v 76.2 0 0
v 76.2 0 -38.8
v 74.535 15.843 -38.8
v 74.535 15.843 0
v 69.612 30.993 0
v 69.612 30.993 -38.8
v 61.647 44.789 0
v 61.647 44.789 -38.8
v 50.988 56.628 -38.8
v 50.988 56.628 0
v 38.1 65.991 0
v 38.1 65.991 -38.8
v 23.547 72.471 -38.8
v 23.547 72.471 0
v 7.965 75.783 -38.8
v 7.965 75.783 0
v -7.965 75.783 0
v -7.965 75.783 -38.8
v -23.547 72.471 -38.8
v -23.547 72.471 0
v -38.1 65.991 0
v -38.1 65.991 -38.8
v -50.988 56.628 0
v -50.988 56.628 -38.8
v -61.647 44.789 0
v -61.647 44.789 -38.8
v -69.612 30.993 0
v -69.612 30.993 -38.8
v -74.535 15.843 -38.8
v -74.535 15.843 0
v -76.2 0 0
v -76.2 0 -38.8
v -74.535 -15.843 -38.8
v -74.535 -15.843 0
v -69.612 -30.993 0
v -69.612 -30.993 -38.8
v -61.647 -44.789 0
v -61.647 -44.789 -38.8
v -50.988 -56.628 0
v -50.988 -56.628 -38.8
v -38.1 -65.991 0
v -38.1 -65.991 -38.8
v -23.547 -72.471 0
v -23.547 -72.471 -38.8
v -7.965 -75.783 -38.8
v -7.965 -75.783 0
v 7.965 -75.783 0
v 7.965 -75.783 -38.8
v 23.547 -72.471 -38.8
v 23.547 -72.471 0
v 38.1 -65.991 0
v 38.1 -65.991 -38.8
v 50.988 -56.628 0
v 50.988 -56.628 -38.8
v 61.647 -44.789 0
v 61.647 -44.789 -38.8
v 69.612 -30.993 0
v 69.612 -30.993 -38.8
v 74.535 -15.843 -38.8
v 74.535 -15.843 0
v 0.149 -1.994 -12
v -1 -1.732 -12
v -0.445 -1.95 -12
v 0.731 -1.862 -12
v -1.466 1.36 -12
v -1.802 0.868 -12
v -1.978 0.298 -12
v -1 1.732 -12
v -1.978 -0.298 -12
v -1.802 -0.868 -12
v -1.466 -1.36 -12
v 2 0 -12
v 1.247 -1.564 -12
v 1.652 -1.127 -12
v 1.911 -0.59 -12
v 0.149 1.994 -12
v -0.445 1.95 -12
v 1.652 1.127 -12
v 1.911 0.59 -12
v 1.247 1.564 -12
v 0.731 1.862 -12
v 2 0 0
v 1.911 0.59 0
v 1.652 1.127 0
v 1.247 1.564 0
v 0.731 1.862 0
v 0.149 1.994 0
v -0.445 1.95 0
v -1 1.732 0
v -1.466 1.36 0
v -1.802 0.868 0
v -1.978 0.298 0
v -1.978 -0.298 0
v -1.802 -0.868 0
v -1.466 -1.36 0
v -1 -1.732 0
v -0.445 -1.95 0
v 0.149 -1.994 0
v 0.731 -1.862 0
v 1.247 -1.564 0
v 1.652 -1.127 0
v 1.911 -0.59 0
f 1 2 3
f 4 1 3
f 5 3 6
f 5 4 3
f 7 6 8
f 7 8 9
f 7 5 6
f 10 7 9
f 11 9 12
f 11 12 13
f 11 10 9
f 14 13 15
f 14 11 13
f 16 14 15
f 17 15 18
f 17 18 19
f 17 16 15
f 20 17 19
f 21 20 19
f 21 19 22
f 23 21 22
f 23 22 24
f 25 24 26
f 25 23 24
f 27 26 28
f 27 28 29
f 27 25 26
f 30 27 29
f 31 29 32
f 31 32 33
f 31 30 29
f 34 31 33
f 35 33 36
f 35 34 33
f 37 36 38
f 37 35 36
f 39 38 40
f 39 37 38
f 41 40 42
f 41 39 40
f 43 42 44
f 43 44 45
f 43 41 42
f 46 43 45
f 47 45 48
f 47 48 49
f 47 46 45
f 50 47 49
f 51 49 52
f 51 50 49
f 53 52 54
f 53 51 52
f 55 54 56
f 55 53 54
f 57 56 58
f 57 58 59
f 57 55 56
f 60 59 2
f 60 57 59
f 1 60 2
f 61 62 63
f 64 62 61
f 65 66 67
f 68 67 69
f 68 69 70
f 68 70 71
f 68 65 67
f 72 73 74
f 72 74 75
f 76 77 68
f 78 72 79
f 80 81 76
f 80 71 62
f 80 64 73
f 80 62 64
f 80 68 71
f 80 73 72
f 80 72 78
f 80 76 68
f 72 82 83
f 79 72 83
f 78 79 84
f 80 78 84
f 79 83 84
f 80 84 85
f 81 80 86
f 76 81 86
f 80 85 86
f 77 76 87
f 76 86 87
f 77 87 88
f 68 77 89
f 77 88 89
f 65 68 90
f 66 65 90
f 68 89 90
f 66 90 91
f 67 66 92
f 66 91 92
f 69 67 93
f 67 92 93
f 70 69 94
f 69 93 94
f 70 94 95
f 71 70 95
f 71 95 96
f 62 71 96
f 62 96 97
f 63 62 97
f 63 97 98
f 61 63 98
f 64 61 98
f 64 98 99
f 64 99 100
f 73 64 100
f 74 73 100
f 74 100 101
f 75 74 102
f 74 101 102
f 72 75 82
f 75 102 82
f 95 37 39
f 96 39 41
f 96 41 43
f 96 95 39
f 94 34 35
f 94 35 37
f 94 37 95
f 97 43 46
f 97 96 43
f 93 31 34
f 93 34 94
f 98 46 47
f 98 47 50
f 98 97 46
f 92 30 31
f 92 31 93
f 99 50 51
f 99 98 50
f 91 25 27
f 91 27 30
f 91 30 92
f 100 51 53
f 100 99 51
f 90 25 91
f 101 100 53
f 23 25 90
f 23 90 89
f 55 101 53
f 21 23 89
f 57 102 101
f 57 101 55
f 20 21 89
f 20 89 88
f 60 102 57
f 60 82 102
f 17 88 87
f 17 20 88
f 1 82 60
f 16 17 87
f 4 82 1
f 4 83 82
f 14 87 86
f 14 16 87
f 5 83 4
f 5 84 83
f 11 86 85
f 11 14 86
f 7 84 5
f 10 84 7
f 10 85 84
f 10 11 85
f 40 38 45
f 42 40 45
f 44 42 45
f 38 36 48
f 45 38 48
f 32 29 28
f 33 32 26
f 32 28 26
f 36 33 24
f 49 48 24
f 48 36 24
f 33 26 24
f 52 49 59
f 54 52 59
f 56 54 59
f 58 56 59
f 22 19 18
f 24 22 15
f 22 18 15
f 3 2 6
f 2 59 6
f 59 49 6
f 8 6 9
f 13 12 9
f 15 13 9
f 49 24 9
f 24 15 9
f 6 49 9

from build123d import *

# Parameters (mm, degrees)
F0_R     = 9
F0_R_2   = 2
F1_DEPTH = 12
F2_R     = 76.2
F3_DEPTH = 38.8
F5_R     = 2
F6_DEPTH = 12


with BuildPart() as f1:
    # F0 (on Top) → F1 (new body)
    with BuildSketch(Plane.XY):
        with Locations((0.035375, -0.025554)):
            Circle(F0_R)
        with Locations((0.035375, -0.025554)):
            Circle(F0_R_2, mode=Mode.SUBTRACT)
    extrude(amount=-F1_DEPTH)

    # F2 (on Top) → F3 (join)
    with BuildSketch(Plane.XY):
        Circle(F2_R)
    extrude(amount=-F3_DEPTH)

    # F5 (on face) → F6 (cut)
    with BuildSketch(Plane.XY):
        Circle(F5_R)
    extrude(amount=-F6_DEPTH, mode=Mode.SUBTRACT)


solid = f1.part
